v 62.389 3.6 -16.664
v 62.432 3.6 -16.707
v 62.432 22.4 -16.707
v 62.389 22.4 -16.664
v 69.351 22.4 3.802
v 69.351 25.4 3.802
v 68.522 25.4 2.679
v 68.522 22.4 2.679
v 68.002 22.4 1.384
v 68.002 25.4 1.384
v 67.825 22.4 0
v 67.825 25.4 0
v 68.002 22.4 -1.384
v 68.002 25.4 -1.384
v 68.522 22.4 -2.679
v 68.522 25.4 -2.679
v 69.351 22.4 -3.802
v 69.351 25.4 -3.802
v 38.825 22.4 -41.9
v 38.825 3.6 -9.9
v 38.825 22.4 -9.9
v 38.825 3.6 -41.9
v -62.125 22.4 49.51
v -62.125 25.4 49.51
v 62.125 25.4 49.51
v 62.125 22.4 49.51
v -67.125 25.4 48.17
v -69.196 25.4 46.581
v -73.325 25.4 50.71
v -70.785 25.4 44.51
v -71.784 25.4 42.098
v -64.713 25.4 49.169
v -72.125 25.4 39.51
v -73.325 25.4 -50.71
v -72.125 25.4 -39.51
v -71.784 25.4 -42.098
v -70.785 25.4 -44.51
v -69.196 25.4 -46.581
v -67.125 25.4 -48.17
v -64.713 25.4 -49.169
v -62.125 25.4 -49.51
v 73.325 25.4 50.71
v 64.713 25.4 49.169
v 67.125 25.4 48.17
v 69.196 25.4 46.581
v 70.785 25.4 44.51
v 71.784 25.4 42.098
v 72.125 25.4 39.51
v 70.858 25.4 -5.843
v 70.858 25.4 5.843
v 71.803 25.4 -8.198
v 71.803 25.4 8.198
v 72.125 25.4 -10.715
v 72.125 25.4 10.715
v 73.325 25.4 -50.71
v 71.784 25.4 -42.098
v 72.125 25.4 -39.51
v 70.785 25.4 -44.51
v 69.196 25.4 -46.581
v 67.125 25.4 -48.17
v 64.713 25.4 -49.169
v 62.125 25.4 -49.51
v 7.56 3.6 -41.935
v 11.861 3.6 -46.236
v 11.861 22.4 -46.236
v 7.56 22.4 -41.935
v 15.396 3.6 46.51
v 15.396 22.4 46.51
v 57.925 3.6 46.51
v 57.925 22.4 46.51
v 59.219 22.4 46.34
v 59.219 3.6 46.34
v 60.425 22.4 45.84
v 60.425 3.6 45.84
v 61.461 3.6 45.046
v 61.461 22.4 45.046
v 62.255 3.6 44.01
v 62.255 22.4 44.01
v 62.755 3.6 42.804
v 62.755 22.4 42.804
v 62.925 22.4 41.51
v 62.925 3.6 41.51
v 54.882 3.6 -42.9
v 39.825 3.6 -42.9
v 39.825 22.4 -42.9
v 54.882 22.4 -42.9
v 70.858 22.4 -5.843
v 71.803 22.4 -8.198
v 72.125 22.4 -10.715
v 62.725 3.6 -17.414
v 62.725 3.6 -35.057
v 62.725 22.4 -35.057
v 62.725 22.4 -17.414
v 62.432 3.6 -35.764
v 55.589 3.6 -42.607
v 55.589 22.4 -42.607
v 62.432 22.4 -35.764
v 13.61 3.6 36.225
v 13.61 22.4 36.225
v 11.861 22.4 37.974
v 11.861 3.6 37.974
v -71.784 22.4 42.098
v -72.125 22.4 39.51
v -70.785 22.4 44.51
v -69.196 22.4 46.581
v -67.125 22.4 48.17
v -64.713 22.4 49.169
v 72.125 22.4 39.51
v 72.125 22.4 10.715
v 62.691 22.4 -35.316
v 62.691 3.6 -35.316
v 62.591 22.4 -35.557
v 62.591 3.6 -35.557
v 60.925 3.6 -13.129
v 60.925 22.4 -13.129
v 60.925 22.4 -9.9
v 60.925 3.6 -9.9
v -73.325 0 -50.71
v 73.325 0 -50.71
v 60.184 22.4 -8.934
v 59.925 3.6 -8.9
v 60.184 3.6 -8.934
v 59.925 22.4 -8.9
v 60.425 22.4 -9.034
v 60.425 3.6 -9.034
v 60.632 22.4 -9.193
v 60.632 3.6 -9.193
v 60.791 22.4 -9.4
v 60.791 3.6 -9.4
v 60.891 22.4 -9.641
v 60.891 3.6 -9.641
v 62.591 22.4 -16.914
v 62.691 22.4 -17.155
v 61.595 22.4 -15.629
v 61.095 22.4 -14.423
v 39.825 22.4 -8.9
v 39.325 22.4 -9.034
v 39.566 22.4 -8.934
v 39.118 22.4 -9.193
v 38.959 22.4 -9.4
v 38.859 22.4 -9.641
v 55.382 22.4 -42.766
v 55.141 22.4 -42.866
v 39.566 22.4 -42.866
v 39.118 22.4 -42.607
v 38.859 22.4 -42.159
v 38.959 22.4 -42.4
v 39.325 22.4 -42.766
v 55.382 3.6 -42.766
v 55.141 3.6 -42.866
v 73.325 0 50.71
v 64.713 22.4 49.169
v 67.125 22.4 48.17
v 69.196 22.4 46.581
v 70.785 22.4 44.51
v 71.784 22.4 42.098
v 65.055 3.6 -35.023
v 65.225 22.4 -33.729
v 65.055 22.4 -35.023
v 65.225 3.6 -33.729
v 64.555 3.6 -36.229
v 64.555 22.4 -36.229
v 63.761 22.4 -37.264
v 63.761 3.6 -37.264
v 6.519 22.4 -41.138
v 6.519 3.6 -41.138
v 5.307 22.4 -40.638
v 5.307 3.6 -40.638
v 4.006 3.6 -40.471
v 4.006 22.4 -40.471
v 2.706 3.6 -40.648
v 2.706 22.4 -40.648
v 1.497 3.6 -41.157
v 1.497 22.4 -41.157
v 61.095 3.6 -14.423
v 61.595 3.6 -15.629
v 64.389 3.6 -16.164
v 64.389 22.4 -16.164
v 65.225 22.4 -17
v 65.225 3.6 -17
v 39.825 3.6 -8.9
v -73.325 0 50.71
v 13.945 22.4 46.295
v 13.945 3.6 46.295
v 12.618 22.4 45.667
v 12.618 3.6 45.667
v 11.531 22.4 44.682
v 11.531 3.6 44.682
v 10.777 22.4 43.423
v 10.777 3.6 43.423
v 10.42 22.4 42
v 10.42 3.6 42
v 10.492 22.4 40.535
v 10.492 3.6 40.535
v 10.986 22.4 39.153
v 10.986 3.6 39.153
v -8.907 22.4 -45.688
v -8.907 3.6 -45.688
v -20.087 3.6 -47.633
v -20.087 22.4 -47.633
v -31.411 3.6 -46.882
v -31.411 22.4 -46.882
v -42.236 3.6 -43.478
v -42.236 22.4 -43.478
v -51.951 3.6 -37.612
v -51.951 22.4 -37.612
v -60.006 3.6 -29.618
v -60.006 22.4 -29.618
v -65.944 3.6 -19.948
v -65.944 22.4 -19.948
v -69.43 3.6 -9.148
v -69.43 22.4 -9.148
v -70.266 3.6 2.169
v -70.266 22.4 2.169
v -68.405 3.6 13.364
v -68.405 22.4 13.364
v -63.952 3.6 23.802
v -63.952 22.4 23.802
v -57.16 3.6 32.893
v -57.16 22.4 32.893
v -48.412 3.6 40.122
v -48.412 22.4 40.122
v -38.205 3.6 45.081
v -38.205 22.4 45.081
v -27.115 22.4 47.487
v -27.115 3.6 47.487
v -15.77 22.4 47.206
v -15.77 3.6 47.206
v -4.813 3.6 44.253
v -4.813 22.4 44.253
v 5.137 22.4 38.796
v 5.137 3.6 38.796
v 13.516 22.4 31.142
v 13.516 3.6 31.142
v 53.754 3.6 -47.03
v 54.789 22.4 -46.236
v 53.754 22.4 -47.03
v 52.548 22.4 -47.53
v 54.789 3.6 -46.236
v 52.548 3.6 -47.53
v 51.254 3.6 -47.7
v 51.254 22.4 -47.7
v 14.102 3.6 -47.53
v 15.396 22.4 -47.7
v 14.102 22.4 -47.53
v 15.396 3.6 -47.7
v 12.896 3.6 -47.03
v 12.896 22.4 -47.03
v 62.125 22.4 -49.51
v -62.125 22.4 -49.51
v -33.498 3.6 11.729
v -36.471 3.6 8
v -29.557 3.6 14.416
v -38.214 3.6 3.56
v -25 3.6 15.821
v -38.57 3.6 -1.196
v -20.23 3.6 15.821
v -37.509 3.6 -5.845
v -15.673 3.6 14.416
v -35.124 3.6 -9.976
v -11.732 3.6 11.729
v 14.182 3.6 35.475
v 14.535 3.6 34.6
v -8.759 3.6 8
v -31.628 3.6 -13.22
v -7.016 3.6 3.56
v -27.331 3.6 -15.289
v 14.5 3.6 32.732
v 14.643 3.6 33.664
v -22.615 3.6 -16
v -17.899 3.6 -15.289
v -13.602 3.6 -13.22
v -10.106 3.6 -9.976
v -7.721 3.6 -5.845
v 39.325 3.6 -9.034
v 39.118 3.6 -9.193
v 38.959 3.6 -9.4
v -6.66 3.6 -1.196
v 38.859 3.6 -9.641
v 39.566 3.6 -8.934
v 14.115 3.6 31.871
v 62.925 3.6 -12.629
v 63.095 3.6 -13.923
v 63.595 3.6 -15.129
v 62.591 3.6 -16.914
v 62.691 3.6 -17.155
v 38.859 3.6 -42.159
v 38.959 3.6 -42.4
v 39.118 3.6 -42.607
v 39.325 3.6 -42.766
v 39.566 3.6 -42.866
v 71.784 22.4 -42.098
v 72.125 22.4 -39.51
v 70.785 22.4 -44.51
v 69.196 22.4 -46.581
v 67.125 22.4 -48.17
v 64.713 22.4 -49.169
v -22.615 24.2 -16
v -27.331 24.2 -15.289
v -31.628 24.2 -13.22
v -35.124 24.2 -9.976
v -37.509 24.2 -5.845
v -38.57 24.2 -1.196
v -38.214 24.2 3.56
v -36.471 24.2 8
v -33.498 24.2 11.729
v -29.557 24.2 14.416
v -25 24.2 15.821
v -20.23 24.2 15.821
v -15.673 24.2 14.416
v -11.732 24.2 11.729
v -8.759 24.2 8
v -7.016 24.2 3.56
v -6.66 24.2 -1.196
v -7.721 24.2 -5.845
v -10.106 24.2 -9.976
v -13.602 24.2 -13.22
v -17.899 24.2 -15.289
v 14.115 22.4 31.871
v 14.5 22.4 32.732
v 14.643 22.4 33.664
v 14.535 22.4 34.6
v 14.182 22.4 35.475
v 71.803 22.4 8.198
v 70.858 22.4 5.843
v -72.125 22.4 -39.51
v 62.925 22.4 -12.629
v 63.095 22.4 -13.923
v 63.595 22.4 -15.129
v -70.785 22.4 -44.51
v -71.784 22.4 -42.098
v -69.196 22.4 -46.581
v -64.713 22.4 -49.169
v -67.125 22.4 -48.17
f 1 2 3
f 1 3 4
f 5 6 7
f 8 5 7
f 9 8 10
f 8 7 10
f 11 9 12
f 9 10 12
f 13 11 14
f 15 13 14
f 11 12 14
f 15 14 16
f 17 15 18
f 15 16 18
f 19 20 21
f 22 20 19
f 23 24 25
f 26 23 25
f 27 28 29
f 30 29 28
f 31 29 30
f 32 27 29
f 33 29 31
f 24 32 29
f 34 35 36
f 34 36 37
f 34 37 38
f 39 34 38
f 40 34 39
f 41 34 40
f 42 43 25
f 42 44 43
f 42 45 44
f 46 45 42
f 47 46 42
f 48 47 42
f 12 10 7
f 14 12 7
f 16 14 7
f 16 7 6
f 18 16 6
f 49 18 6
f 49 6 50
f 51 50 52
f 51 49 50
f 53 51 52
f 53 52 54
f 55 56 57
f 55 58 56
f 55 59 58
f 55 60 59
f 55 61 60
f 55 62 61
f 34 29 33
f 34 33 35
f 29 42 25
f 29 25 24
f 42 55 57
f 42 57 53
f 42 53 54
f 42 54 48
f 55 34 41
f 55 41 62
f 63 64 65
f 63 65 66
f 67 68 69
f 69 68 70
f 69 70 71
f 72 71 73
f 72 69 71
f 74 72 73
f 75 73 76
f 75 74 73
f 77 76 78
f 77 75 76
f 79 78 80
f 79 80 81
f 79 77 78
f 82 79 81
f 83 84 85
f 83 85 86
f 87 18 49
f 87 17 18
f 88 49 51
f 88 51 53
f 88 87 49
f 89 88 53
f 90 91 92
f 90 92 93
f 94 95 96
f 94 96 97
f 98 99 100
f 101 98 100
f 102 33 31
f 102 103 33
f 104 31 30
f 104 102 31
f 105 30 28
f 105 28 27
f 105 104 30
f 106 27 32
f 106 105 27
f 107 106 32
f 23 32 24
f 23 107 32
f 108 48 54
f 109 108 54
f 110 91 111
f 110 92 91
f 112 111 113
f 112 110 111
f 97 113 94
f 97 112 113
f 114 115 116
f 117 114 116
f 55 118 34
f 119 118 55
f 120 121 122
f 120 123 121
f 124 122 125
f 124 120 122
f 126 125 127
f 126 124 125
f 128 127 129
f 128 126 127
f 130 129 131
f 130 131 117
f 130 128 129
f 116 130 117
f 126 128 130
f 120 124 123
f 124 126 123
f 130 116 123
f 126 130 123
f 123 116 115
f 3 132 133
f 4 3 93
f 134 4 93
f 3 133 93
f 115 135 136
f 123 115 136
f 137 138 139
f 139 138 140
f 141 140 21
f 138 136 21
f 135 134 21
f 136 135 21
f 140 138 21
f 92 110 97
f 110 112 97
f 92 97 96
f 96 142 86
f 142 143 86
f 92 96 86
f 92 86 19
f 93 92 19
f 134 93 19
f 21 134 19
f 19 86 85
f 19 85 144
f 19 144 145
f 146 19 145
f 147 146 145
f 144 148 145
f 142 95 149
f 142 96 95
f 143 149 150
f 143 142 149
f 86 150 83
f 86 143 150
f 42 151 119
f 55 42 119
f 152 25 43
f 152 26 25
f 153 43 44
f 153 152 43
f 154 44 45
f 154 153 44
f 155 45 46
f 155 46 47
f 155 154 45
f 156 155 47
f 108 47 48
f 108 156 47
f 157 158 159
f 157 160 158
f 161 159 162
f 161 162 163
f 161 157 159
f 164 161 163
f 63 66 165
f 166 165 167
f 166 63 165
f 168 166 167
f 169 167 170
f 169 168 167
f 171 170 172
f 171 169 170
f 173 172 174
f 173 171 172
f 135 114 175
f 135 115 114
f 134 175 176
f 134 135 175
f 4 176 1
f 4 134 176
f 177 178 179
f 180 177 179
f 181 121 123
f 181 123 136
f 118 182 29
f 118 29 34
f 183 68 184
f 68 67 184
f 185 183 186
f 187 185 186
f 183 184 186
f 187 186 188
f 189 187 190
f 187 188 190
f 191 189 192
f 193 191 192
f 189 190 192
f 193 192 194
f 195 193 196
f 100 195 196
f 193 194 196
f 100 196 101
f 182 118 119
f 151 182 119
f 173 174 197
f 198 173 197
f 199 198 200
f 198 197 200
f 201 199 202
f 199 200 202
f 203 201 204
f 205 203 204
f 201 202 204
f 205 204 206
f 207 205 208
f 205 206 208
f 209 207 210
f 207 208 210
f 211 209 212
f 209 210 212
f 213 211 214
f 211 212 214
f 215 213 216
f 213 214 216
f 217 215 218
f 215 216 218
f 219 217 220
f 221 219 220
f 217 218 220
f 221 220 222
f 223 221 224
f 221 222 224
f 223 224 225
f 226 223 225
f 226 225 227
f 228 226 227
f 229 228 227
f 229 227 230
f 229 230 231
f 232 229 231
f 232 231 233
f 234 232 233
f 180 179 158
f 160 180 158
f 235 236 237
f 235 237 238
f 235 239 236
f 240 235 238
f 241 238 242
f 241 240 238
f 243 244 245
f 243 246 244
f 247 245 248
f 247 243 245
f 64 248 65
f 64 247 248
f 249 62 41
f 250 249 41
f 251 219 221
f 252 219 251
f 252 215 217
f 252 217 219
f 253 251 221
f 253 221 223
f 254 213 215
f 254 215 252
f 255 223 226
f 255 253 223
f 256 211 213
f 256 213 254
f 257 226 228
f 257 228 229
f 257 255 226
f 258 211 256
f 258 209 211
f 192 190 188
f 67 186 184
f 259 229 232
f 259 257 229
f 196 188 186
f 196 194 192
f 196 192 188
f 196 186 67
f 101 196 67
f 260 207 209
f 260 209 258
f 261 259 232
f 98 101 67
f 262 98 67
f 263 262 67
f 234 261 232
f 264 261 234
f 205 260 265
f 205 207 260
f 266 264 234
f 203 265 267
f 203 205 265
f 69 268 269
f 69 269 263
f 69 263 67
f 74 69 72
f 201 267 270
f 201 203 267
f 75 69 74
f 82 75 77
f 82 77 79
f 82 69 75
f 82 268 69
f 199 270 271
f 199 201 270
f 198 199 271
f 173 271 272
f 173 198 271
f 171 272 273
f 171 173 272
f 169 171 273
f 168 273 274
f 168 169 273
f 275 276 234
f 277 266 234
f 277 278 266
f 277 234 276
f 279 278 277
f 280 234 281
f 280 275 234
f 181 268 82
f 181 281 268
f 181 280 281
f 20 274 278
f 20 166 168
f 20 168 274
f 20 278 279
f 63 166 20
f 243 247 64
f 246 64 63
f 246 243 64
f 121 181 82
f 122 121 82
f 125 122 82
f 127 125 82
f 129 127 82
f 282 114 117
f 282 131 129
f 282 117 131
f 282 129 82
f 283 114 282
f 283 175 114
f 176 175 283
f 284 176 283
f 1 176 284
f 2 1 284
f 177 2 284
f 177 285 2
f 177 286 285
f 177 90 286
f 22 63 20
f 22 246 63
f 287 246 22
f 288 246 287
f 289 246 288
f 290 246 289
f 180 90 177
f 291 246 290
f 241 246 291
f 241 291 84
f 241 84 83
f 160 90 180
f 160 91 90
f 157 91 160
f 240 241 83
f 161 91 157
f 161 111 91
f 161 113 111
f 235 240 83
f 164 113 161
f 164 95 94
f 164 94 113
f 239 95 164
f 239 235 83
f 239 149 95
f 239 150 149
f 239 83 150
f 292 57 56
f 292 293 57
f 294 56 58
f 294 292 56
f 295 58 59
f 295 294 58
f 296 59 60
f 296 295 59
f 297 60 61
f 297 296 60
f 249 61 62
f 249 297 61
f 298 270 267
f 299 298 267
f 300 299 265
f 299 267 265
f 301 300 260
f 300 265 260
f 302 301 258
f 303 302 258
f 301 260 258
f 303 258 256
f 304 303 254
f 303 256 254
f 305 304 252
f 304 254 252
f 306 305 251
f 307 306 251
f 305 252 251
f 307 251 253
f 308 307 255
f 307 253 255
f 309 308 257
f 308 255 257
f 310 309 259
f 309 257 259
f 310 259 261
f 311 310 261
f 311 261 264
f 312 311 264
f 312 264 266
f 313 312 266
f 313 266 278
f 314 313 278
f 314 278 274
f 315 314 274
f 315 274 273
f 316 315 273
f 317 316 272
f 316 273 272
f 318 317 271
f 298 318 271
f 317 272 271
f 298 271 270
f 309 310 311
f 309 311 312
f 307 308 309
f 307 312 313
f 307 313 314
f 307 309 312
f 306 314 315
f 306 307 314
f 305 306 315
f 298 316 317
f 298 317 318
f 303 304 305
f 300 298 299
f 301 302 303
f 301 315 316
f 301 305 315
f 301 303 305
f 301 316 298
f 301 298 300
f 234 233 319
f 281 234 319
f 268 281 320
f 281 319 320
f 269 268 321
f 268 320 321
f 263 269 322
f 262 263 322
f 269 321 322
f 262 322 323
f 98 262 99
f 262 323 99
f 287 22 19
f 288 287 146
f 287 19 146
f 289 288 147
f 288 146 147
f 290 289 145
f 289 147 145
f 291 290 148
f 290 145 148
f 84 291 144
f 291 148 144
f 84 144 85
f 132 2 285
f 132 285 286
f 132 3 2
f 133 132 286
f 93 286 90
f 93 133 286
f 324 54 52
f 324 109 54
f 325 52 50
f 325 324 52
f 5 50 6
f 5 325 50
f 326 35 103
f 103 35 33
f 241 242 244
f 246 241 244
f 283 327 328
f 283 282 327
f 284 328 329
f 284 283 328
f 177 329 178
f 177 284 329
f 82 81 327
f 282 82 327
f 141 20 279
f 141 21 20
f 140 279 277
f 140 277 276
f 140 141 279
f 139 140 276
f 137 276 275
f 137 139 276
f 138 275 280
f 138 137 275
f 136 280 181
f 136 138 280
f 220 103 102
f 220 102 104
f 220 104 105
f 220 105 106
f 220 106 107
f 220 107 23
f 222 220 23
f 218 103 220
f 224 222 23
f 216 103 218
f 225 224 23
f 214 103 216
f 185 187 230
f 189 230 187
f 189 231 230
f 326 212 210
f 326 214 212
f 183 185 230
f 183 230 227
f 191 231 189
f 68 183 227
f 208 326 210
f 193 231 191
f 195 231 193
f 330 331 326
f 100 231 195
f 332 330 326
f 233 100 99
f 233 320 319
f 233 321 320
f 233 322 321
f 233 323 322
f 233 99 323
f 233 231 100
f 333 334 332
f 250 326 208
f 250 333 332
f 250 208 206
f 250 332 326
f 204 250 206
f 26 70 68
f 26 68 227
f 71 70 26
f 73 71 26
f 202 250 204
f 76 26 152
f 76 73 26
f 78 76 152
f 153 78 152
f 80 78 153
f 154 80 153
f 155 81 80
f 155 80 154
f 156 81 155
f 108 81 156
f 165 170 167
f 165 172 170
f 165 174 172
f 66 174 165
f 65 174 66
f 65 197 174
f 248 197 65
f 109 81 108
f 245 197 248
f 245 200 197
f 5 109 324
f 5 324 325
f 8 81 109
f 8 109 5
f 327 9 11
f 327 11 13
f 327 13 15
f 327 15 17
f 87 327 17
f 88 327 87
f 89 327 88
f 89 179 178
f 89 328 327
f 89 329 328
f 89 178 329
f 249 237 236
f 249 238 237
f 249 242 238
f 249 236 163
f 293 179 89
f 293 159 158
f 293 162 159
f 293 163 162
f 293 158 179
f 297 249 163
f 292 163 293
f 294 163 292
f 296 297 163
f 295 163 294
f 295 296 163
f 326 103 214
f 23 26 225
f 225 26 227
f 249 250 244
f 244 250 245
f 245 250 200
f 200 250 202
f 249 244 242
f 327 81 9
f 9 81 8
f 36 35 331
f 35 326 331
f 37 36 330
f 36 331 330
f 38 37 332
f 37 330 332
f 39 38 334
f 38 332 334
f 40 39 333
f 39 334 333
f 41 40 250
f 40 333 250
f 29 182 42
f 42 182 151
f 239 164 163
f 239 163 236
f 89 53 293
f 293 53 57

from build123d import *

# Parameters (mm, degrees)
SKETCH1_W           = 146.65
SKETCH1_H           = 101.42
BOSS_EXTRUDE1_DEPTH = 25.4
CUT_EXTRUDE1_DEPTH  = 3
FILLET1_R           = 10
SKETCH3_R           = 47.7
CUT_EXTRUDE2_DEPTH  = 18.8
FILLET2_R           = 5
SKETCH4_R           = 16
BOSS_EXTRUDE2_DEPTH = 20.6
BOSS_EXTRUDE3_DEPTH = 18.8
FILLET4_R           = 1
FILLET5_R           = 5


with BuildPart() as part:
    # Sketch1 → Boss-Extrude1 (new body)
    with BuildSketch(Plane(origin=(0, 0, 0), x_dir=(1, 0, 0), z_dir=(0, 1, 0))):
        Rectangle(SKETCH1_W, SKETCH1_H)
    extrude(amount=BOSS_EXTRUDE1_DEPTH)

    # Sketch2 → Cut-Extrude1 (cut)
    with BuildSketch(Plane(origin=(0, 25.4, 0), x_dir=(1, 0, 0), z_dir=(0, 1, 0))):
        with BuildLine():
            Line((-72.125, 49.51), (-72.125, -49.51))
            Line((-72.125, -49.51), (72.125, -49.51))
            Line((72.125, -49.51), (72.125, -5.36749476))
            ThreePointArc((72.125, -5.36749476), (67.825, 0), (72.125, 5.36749476))
            Line((72.125, 5.36749476), (72.125, 49.51))
            Line((72.125, 49.51), (-72.125, 49.51))
        make_face()
    extrude(amount=-CUT_EXTRUDE1_DEPTH, mode=Mode.SUBTRACT)

    # Fillet1
    fillet1_edges = [part.edges().sort_by_distance(p)[0] for p in [
        (72.125, 23.9, -5.36749476),
        (72.125, 23.9, 5.36749476),
        (72.125, 23.9, 49.51),
        (-72.125, 23.9, 49.51),
        (-72.125, 23.9, -49.51),
        (72.125, 23.9, -49.51),
    ]]
    fillet(fillet1_edges, radius=FILLET1_R)

    # Sketch3 → Cut-Extrude2 (cut)
    with BuildSketch(Plane(origin=(0, 22.4, 0), x_dir=(1, 0, 0), z_dir=(0, 1, 0))):
        with BuildLine():
            Line((3.325, -46.51), (62.925, -46.51))
            Line((62.925, -46.51), (62.925, 14.7))
            Line((62.925, 14.7), (65.225, 17))
            Line((65.225, 17), (65.225, 35.8))
            Line((65.225, 35.8), (53.325, 47.7))
            Line((53.325, 47.7), (13.325, 47.7))
            Line((13.325, 47.7), (4.71750668, 39.09250668))
            ThreePointArc((4.71750668, 39.09250668), (19.687781047, 22.040070682), (25.085, 0))
            ThreePointArc((25.085, 0), (22.099291128, -16.610905119), (13.515936315, -31.142341611))
            ThreePointArc((13.515936315, -31.142341611), (14.64327542, -33.663677787), (13.61, -36.225))
            Line((13.61, -36.225), (3.325, -46.51))
        make_face()
        with Locations((-22.615, 0)):
            Circle(SKETCH3_R)
    extrude(amount=-CUT_EXTRUDE2_DEPTH, mode=Mode.SUBTRACT)

    # Fillet2
    fillet2_edges = [part.edges().sort_by_distance(p)[0] for p in [
        (4.71750668, 13, -39.09250668),
        (13.325, 13, -47.7),
        (53.325, 13, -47.7),
        (65.225, 13, -35.8),
        (62.925, 13, -14.7),
        (62.925, 13, 46.51),
        (3.325, 13, 46.51),
    ]]
    fillet(fillet2_edges, radius=FILLET2_R)

    # Sketch4 → Boss-Extrude2 (add)
    with BuildSketch(Plane(origin=(0, 3.6, 0), x_dir=(1, 0, 0), z_dir=(0, 1, 0))):
        with Locations(Location((-22.615, 0, 0), (0, 0, 90))):
            Circle(SKETCH4_R)
    extrude(amount=BOSS_EXTRUDE2_DEPTH)

    # Sketch5 → Boss-Extrude3 (add)
    with BuildSketch(Plane(origin=(0, 3.6, 0), x_dir=(1, 0, 0), z_dir=(0, 1, 0))):
        Polygon((38.825, 42.9), (55.296572875, 42.9), (62.725, 35.471572875), (62.725, 17), (60.925, 15.2), (60.925, 8.9), (38.825, 8.9), align=None)
    extrude(amount=BOSS_EXTRUDE3_DEPTH)

    # Fillet4
    fillet4_edges = [part.edges().sort_by_distance(p)[0] for p in [
        (38.825, 13, -42.9),
        (38.825, 13, -8.9),
        (60.925, 13, -8.9),
        (62.725, 13, -17),
        (62.725, 13, -35.471572875),
        (55.296572875, 13, -42.9),
    ]]
    fillet(fillet4_edges, radius=FILLET4_R)

    # Fillet5
    fillet5_edges = [part.edges().sort_by_distance(p)[0] for p in [
        (60.925, 13, -15.2),
    ]]
    fillet(fillet5_edges, radius=FILLET5_R)


solid = part.part
